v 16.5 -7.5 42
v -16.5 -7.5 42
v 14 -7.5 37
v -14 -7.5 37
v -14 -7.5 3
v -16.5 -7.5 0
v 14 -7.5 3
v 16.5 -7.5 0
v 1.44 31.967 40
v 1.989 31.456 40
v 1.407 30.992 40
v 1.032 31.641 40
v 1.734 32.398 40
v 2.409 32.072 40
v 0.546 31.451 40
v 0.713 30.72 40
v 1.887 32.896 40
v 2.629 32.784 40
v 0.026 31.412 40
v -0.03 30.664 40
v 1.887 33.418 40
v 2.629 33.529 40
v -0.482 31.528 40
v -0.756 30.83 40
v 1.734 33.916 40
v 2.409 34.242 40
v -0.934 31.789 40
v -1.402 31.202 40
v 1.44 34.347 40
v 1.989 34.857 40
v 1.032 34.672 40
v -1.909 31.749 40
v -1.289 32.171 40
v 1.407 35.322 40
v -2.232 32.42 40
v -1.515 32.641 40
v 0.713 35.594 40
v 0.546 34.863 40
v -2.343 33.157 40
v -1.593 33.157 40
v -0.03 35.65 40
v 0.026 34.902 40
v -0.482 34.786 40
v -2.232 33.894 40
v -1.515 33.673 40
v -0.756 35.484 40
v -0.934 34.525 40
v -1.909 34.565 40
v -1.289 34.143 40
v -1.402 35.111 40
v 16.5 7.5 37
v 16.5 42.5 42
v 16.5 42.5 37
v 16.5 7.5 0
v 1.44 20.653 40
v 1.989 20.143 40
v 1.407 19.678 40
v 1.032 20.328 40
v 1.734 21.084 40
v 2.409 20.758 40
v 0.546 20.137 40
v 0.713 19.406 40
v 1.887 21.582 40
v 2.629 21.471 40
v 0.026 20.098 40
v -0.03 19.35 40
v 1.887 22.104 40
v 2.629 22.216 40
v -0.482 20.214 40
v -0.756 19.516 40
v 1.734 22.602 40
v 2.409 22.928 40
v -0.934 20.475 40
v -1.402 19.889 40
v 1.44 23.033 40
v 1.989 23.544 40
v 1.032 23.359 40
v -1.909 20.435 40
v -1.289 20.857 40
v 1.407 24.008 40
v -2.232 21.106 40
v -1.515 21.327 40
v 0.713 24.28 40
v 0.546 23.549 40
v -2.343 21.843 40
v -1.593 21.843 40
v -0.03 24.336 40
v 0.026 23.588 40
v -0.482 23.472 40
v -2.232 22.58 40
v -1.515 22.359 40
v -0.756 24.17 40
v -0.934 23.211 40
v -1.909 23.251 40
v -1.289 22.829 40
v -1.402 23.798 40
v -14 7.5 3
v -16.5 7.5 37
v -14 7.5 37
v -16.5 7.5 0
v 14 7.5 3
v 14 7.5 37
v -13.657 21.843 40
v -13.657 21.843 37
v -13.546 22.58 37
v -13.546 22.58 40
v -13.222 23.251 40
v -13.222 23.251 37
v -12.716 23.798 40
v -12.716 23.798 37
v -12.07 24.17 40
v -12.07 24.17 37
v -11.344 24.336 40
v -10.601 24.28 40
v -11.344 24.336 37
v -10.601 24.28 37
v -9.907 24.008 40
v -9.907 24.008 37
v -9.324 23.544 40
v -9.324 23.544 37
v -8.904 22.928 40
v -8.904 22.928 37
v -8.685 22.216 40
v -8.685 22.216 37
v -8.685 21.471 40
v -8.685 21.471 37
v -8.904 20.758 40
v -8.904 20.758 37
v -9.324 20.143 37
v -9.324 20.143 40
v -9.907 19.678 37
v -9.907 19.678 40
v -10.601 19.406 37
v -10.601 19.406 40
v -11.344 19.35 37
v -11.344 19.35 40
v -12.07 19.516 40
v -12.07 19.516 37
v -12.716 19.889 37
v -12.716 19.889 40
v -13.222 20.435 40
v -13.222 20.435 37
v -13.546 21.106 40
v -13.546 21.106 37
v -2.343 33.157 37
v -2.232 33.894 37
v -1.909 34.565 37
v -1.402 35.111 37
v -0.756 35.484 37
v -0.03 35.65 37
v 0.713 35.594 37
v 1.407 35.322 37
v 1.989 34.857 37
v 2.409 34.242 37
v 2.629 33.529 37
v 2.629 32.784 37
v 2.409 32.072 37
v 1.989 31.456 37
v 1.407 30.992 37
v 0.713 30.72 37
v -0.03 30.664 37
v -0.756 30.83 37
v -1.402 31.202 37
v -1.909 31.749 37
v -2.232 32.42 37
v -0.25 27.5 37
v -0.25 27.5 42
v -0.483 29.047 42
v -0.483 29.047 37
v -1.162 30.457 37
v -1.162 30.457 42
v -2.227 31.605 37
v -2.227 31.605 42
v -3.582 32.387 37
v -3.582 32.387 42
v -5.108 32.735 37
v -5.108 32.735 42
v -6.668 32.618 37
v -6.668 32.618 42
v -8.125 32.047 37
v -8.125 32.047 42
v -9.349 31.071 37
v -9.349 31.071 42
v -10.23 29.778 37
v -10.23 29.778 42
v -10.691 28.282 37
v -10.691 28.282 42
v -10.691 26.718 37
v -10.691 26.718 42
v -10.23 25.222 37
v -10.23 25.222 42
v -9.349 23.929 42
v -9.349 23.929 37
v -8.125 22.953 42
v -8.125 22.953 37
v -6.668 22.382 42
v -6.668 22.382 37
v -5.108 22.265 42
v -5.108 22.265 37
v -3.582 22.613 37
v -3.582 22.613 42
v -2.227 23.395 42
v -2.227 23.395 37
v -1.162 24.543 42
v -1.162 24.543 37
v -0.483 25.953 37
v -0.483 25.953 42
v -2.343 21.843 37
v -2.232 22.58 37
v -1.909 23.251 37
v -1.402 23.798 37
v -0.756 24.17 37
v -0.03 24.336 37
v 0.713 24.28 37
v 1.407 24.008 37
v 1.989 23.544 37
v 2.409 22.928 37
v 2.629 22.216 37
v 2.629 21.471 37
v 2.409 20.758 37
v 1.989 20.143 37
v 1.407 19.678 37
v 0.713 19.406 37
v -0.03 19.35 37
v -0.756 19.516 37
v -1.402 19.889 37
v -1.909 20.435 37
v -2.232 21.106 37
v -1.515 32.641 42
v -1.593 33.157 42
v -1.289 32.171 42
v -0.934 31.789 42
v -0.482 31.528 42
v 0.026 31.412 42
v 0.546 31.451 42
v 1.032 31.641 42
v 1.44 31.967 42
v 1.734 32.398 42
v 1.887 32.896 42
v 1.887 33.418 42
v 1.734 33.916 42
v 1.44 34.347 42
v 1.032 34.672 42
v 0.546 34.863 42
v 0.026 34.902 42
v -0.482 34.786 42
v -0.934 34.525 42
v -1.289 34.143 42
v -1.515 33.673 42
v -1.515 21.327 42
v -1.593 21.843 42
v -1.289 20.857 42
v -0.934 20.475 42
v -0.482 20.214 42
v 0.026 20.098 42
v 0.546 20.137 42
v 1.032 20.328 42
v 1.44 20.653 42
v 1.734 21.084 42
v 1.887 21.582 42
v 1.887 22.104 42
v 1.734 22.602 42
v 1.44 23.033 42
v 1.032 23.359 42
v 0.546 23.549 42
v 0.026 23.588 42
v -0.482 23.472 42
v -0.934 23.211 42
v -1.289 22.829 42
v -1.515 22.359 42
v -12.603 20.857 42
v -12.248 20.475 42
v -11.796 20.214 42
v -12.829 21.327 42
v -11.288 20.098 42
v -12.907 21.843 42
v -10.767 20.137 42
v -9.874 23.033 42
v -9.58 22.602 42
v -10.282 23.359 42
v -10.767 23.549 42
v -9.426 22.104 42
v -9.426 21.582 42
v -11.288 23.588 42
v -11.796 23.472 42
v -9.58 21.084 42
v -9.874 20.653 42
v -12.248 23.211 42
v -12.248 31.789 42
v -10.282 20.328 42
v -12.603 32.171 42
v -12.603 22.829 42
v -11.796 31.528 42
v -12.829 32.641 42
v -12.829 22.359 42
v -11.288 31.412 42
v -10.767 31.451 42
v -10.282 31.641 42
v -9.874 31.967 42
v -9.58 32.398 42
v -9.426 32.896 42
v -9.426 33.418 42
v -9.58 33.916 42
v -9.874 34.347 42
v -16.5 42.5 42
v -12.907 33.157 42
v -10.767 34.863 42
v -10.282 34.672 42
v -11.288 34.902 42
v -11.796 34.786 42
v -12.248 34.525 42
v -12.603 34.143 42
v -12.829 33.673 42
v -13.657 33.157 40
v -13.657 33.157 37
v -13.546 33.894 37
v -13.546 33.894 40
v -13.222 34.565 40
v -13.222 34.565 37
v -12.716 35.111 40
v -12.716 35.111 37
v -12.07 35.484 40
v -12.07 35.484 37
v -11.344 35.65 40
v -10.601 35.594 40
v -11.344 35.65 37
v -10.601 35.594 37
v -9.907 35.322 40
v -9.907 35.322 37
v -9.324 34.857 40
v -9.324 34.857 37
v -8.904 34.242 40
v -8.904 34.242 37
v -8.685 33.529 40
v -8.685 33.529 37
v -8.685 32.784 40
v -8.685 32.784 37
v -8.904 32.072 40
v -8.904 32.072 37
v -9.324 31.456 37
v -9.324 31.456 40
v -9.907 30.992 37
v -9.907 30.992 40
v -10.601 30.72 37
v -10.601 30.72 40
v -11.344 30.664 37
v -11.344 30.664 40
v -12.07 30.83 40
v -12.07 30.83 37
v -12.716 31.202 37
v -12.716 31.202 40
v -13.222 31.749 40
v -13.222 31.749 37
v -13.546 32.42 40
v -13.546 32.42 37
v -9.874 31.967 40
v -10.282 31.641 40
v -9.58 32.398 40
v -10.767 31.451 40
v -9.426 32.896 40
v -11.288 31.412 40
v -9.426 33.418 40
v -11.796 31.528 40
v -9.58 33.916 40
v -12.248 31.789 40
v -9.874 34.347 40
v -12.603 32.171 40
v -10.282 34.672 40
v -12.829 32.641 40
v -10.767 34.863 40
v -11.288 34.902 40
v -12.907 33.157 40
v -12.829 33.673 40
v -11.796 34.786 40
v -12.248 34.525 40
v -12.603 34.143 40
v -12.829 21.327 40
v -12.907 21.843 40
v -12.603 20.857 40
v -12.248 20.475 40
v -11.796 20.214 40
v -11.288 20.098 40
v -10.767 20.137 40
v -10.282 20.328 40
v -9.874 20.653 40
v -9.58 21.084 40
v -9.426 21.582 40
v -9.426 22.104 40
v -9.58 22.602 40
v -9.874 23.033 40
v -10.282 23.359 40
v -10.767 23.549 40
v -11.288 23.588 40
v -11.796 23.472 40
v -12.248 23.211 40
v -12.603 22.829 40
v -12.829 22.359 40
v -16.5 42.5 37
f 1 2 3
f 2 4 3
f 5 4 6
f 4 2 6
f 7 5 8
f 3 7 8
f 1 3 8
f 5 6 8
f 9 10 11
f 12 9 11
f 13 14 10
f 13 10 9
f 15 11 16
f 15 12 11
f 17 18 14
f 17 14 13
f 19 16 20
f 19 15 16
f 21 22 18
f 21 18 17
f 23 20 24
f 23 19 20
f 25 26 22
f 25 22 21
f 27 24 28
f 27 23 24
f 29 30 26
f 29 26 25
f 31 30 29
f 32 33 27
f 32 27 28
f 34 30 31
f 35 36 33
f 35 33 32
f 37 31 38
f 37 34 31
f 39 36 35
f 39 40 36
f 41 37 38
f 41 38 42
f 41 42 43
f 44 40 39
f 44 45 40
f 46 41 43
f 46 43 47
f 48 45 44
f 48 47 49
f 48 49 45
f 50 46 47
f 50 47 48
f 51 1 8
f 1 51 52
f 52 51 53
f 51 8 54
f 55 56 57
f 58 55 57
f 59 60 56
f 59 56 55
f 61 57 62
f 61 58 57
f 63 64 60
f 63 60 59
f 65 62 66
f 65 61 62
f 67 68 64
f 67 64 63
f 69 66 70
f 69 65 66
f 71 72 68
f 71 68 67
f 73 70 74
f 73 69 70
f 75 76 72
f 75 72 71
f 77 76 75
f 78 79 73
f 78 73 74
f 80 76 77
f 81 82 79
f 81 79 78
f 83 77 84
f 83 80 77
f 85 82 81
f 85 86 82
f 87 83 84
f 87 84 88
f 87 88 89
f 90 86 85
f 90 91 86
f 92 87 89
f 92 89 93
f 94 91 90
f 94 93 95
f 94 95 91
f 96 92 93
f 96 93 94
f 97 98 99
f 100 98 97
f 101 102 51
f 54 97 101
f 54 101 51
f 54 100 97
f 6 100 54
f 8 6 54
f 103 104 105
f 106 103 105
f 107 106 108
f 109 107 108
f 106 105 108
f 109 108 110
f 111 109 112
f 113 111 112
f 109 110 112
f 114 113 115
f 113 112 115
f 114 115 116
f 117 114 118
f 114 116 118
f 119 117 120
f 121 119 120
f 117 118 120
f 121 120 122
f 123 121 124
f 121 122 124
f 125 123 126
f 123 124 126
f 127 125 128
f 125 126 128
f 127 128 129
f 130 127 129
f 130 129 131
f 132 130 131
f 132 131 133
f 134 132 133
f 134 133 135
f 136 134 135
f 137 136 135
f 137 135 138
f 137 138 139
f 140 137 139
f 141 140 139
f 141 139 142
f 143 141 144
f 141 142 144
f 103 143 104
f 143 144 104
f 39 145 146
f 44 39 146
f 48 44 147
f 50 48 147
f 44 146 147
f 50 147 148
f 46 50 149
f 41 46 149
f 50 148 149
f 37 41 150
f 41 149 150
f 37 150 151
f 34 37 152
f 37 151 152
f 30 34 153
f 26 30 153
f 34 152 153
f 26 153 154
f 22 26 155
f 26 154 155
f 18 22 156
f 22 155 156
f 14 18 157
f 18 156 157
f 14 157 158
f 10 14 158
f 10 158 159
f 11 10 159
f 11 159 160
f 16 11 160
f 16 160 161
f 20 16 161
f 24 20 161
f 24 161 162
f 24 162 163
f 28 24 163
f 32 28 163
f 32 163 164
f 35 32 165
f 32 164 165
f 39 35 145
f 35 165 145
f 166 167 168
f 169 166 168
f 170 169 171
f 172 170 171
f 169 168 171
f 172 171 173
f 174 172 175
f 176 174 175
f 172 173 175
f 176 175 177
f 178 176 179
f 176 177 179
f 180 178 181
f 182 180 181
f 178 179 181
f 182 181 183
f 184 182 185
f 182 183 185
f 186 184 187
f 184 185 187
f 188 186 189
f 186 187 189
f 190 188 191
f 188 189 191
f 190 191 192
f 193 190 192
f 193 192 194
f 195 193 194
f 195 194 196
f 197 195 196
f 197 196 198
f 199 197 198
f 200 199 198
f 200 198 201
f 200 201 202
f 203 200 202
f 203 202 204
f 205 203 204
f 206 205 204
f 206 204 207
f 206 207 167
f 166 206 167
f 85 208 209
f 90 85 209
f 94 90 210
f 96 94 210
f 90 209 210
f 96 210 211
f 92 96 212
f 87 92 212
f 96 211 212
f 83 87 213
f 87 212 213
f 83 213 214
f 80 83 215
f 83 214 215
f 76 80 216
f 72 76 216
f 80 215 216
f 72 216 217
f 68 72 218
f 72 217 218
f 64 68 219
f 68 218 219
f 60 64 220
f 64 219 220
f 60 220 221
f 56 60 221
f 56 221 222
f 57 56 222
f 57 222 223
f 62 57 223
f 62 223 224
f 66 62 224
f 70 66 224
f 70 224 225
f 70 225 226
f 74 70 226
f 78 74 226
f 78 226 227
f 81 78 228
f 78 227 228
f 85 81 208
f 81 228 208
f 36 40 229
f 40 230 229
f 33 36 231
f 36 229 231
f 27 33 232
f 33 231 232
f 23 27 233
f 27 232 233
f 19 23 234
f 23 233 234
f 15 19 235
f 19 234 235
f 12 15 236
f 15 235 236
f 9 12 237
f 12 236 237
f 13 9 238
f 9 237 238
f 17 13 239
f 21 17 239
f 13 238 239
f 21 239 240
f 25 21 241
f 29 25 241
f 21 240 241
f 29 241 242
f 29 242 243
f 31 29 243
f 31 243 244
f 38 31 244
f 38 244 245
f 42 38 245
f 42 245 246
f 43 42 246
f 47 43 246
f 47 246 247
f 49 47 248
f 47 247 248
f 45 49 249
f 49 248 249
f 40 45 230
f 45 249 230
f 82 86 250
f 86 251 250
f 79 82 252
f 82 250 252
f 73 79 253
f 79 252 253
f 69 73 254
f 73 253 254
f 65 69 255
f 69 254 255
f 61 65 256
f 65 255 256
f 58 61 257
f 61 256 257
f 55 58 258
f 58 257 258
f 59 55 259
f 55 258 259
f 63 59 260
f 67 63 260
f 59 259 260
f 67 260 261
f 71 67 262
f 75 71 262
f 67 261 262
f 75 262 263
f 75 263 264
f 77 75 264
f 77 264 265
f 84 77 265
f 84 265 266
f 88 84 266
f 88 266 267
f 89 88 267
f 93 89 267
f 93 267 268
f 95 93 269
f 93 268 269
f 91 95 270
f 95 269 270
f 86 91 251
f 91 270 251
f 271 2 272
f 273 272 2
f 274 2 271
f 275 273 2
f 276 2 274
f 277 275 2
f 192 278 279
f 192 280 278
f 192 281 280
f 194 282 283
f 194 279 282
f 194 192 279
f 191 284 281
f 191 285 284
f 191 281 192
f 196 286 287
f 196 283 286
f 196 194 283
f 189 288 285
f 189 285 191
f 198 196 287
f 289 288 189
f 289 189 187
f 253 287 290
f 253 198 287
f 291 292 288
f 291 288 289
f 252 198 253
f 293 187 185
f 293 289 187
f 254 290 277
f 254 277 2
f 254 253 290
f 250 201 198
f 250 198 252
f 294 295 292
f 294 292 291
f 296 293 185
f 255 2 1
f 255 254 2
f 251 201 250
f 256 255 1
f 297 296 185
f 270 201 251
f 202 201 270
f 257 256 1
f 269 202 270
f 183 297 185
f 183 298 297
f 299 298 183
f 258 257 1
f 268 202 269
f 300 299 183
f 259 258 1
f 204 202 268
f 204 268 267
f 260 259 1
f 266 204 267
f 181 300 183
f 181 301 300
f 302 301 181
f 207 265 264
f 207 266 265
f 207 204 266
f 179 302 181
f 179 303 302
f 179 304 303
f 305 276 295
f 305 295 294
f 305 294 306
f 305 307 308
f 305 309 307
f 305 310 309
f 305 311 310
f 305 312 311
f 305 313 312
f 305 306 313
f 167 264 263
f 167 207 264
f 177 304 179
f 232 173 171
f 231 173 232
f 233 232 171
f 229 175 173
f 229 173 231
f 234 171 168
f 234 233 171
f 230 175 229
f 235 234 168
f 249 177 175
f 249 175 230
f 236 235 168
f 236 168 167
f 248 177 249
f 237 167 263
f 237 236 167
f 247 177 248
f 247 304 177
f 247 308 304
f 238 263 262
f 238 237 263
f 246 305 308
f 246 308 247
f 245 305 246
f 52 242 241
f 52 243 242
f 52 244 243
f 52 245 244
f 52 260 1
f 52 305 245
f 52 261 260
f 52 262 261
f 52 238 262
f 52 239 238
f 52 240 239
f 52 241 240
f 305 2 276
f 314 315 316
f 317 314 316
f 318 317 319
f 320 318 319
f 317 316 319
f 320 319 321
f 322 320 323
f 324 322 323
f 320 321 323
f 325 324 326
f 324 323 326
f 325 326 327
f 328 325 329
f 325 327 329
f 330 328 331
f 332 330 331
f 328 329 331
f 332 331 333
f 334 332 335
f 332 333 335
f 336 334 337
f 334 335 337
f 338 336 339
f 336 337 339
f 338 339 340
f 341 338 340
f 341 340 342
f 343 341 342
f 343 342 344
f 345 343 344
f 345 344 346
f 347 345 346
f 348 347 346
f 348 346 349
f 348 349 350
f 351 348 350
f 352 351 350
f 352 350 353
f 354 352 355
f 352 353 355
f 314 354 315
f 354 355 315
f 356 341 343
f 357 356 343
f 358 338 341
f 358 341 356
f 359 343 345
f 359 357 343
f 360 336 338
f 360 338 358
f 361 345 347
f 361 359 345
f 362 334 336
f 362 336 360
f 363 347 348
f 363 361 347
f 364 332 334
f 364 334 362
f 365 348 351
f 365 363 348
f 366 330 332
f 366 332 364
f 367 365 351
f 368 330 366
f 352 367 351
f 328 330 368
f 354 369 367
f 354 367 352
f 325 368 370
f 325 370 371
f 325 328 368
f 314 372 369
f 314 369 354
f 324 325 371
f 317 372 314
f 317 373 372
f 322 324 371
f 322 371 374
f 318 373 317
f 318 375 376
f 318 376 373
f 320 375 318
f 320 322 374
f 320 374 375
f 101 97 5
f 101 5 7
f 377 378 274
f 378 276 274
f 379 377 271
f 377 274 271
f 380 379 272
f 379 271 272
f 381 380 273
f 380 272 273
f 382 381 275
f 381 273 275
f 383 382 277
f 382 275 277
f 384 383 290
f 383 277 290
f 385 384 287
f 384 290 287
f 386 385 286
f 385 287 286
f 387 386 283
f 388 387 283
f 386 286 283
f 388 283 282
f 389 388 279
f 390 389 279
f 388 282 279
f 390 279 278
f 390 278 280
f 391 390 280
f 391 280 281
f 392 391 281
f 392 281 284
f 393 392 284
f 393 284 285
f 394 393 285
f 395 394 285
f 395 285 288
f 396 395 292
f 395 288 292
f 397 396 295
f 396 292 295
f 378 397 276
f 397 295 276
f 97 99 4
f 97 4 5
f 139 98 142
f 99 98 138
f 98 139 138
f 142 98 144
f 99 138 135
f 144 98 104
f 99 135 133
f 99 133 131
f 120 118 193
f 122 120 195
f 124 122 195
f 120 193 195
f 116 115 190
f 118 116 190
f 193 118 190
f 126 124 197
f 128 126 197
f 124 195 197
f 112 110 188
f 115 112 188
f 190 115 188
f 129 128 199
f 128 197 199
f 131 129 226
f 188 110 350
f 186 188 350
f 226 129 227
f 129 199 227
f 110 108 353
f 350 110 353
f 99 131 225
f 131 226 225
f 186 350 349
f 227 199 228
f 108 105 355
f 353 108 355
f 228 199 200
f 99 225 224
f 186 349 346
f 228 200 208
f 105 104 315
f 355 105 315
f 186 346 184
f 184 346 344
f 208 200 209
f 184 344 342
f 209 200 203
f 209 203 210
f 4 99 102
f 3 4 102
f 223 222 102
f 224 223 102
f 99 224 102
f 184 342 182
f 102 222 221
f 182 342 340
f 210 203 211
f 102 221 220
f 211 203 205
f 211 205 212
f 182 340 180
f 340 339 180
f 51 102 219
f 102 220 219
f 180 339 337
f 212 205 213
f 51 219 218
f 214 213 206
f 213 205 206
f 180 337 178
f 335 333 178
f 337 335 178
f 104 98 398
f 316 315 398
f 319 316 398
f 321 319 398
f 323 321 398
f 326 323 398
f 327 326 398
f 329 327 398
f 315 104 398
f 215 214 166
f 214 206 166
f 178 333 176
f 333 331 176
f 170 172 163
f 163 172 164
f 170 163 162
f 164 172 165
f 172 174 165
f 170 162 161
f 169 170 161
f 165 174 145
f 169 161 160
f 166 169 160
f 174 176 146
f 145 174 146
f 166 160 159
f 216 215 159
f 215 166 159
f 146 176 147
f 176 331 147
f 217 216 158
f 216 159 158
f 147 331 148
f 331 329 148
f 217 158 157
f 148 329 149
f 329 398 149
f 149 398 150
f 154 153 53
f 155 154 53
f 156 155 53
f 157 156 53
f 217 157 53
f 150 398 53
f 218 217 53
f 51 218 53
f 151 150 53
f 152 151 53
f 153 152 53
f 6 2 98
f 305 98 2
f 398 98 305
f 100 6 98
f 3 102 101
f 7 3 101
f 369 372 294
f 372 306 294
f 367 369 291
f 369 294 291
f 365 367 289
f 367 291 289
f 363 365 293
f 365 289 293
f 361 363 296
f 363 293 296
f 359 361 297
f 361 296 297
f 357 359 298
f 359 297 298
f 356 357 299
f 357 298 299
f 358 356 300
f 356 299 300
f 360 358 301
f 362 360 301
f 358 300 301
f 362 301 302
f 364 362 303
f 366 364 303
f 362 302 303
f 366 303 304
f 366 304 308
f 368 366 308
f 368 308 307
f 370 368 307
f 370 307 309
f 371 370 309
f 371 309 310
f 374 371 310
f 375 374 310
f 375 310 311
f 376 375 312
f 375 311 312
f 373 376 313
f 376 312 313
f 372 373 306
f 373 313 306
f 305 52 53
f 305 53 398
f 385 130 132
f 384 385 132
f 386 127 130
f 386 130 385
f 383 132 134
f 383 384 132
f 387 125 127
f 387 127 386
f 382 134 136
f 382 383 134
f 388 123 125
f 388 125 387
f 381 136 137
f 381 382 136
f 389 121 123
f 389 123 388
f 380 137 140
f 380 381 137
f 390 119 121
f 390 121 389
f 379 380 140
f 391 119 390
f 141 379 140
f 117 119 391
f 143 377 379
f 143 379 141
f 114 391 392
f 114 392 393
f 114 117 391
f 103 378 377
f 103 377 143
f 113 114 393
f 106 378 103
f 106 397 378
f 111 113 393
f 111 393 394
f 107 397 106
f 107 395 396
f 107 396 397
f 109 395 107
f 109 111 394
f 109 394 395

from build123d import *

# Parameters (mm, degrees)
SZKIC1_W                    = 33
SZKIC1_H                    = 15
DODANIE_WYCI_GNI_CIE1_DEPTH = 40
SZKIC2_W                    = 28
SZKIC2_H                    = 34
WYTNIJ_WYCI_GNI_CIE1_DEPTH  = 29
SZKIC3_W                    = 33
SZKIC3_H                    = 50
DODANIE_WYCI_GNI_CIE2_DEPTH = 2
SZKIC3_3_R                  = 4
WYTNIJ_WYCI_GNI_CIE2_DEPTH  = 16
SZKIC7_W                    = 33
SZKIC7_H                    = 50
DODANIE_WYCI_GNI_CIE3_DEPTH = 3
SZKIC3_5_R                  = 1.75
WYTNIJ_WYCI_GNI_CIE5_DEPTH  = 14.5
SZKIC3_6_R                  = 1.75
WYTNIJ_WYCI_GNI_CIE6_DEPTH  = 14.5
SZKIC3_7_R                  = 1.75
WYTNIJ_WYCI_GNI_CIE7_DEPTH  = 8.5
SZKIC5_R                    = 5.25
WYTNIJ_WYCI_GNI_CIE10_DEPTH = 36
SZKIC3_8_R                  = 1.75
WYTNIJ_WYCI_GNI_CIE8_DEPTH  = 5.5
SZKIC9_R                    = 2.5
WYTNIJ_WYCI_GNI_CIE11_DEPTH = 3
SZKIC9_4_R                  = 2.5
WYTNIJ_WYCI_GNI_CIE12_DEPTH = 3
SZKIC9_5_R                  = 2.5
WYTNIJ_WYCI_GNI_CIE13_DEPTH = 3
SZKIC9_6_R                  = 2.5
WYTNIJ_WYCI_GNI_CIE14_DEPTH = 3


with BuildPart() as part:
    # Szkic1 → Dodanie-wyciągnięcie1 (new body)
    with BuildSketch(Plane.XY):
        Rectangle(SZKIC1_W, SZKIC1_H)
    extrude(amount=DODANIE_WYCI_GNI_CIE1_DEPTH)

    # Szkic2 → Wytnij-wyciągnięcie1 (cut)
    with BuildSketch(Plane(origin=(0, 7.5, 0), x_dir=(1, 0, 0), z_dir=(0, 1, 0))):
        with Locations((0, -20)):
            Rectangle(SZKIC2_W, SZKIC2_H)
    extrude(amount=-WYTNIJ_WYCI_GNI_CIE1_DEPTH, mode=Mode.SUBTRACT)

    # Szkic3 → Dodanie-wyciągnięcie2 (add)
    with BuildSketch(Plane.XY.offset(40)):
        with Locations((0, 17.5)):
            Rectangle(SZKIC3_W, SZKIC3_H)
    extrude(amount=DODANIE_WYCI_GNI_CIE2_DEPTH)

    # Szkic3<3> → Wytnij-wyciągnięcie2 (cut)
    with BuildSketch(Plane.XY.offset(40)):
        with Locations((-5.5, 27.5)):
            Circle(SZKIC3_3_R)
    extrude(amount=WYTNIJ_WYCI_GNI_CIE2_DEPTH, mode=Mode.SUBTRACT)

    # Szkic7 → Dodanie-wyciągnięcie3 (add)
    with BuildSketch(Plane(origin=(0, 0, 40), x_dir=(-1, 0, 0), z_dir=(0, 0, -1))):
        with Locations((0, 17.5)):
            Rectangle(SZKIC7_W, SZKIC7_H)
    extrude(amount=DODANIE_WYCI_GNI_CIE3_DEPTH)

    # Szkic3<5> → Wytnij-wyciągnięcie5 (cut, symmetric)
    with BuildSketch(Plane.XY.offset(40)):
        with Locations((-11.156854249, 33.156854249)):
            Circle(SZKIC3_5_R)
    extrude(amount=WYTNIJ_WYCI_GNI_CIE5_DEPTH, both=True, mode=Mode.SUBTRACT)

    # Szkic3<6> → Wytnij-wyciągnięcie6 (cut, symmetric)
    with BuildSketch(Plane.XY.offset(40)):
        with Locations((-11.156854249, 21.843145751)):
            Circle(SZKIC3_6_R)
    extrude(amount=WYTNIJ_WYCI_GNI_CIE6_DEPTH, both=True, mode=Mode.SUBTRACT)

    # Szkic3<7> → Wytnij-wyciągnięcie7 (cut, symmetric)
    with BuildSketch(Plane.XY.offset(40)):
        with Locations((0.156854249, 33.156854249)):
            Circle(SZKIC3_7_R)
    extrude(amount=WYTNIJ_WYCI_GNI_CIE7_DEPTH, both=True, mode=Mode.SUBTRACT)

    # Szkic5 → Wytnij-wyciągnięcie10 (cut)
    with BuildSketch(Plane.XY.offset(42)):
        with Locations((-5.5, 27.5)):
            Circle(SZKIC5_R)
    extrude(amount=-WYTNIJ_WYCI_GNI_CIE10_DEPTH, mode=Mode.SUBTRACT)

    # Szkic3<8> → Wytnij-wyciągnięcie8 (cut, symmetric)
    with BuildSketch(Plane.XY.offset(40)):
        with Locations((0.156854249, 21.843145751)):
            Circle(SZKIC3_8_R)
    extrude(amount=WYTNIJ_WYCI_GNI_CIE8_DEPTH, both=True, mode=Mode.SUBTRACT)

    # Szkic9 → Wytnij-wyciągnięcie11 (cut)
    with BuildSketch(Plane(origin=(0, 0, 37), x_dir=(-1, 0, 0), z_dir=(0, 0, -1))):
        with Locations((-0.156854249, 33.156854249)):
            Circle(SZKIC9_R)
    extrude(amount=-WYTNIJ_WYCI_GNI_CIE11_DEPTH, mode=Mode.SUBTRACT)

    # Szkic9<4> → Wytnij-wyciągnięcie12 (cut)
    with BuildSketch(Plane(origin=(0, 0, 37), x_dir=(-1, 0, 0), z_dir=(0, 0, -1))):
        with Locations((11.156854249, 33.156854249)):
            Circle(SZKIC9_4_R)
    extrude(amount=-WYTNIJ_WYCI_GNI_CIE12_DEPTH, mode=Mode.SUBTRACT)

    # Szkic9<5> → Wytnij-wyciągnięcie13 (cut)
    with BuildSketch(Plane(origin=(0, 0, 37), x_dir=(-1, 0, 0), z_dir=(0, 0, -1))):
        with Locations((11.156854249, 21.843145751)):
            Circle(SZKIC9_5_R)
    extrude(amount=-WYTNIJ_WYCI_GNI_CIE13_DEPTH, mode=Mode.SUBTRACT)

    # Szkic9<6> → Wytnij-wyciągnięcie14 (cut)
    with BuildSketch(Plane(origin=(0, 0, 37), x_dir=(-1, 0, 0), z_dir=(0, 0, -1))):
        with Locations((-0.156854249, 21.843145751)):
            Circle(SZKIC9_6_R)
    extrude(amount=-WYTNIJ_WYCI_GNI_CIE14_DEPTH, mode=Mode.SUBTRACT)


solid = part.part
